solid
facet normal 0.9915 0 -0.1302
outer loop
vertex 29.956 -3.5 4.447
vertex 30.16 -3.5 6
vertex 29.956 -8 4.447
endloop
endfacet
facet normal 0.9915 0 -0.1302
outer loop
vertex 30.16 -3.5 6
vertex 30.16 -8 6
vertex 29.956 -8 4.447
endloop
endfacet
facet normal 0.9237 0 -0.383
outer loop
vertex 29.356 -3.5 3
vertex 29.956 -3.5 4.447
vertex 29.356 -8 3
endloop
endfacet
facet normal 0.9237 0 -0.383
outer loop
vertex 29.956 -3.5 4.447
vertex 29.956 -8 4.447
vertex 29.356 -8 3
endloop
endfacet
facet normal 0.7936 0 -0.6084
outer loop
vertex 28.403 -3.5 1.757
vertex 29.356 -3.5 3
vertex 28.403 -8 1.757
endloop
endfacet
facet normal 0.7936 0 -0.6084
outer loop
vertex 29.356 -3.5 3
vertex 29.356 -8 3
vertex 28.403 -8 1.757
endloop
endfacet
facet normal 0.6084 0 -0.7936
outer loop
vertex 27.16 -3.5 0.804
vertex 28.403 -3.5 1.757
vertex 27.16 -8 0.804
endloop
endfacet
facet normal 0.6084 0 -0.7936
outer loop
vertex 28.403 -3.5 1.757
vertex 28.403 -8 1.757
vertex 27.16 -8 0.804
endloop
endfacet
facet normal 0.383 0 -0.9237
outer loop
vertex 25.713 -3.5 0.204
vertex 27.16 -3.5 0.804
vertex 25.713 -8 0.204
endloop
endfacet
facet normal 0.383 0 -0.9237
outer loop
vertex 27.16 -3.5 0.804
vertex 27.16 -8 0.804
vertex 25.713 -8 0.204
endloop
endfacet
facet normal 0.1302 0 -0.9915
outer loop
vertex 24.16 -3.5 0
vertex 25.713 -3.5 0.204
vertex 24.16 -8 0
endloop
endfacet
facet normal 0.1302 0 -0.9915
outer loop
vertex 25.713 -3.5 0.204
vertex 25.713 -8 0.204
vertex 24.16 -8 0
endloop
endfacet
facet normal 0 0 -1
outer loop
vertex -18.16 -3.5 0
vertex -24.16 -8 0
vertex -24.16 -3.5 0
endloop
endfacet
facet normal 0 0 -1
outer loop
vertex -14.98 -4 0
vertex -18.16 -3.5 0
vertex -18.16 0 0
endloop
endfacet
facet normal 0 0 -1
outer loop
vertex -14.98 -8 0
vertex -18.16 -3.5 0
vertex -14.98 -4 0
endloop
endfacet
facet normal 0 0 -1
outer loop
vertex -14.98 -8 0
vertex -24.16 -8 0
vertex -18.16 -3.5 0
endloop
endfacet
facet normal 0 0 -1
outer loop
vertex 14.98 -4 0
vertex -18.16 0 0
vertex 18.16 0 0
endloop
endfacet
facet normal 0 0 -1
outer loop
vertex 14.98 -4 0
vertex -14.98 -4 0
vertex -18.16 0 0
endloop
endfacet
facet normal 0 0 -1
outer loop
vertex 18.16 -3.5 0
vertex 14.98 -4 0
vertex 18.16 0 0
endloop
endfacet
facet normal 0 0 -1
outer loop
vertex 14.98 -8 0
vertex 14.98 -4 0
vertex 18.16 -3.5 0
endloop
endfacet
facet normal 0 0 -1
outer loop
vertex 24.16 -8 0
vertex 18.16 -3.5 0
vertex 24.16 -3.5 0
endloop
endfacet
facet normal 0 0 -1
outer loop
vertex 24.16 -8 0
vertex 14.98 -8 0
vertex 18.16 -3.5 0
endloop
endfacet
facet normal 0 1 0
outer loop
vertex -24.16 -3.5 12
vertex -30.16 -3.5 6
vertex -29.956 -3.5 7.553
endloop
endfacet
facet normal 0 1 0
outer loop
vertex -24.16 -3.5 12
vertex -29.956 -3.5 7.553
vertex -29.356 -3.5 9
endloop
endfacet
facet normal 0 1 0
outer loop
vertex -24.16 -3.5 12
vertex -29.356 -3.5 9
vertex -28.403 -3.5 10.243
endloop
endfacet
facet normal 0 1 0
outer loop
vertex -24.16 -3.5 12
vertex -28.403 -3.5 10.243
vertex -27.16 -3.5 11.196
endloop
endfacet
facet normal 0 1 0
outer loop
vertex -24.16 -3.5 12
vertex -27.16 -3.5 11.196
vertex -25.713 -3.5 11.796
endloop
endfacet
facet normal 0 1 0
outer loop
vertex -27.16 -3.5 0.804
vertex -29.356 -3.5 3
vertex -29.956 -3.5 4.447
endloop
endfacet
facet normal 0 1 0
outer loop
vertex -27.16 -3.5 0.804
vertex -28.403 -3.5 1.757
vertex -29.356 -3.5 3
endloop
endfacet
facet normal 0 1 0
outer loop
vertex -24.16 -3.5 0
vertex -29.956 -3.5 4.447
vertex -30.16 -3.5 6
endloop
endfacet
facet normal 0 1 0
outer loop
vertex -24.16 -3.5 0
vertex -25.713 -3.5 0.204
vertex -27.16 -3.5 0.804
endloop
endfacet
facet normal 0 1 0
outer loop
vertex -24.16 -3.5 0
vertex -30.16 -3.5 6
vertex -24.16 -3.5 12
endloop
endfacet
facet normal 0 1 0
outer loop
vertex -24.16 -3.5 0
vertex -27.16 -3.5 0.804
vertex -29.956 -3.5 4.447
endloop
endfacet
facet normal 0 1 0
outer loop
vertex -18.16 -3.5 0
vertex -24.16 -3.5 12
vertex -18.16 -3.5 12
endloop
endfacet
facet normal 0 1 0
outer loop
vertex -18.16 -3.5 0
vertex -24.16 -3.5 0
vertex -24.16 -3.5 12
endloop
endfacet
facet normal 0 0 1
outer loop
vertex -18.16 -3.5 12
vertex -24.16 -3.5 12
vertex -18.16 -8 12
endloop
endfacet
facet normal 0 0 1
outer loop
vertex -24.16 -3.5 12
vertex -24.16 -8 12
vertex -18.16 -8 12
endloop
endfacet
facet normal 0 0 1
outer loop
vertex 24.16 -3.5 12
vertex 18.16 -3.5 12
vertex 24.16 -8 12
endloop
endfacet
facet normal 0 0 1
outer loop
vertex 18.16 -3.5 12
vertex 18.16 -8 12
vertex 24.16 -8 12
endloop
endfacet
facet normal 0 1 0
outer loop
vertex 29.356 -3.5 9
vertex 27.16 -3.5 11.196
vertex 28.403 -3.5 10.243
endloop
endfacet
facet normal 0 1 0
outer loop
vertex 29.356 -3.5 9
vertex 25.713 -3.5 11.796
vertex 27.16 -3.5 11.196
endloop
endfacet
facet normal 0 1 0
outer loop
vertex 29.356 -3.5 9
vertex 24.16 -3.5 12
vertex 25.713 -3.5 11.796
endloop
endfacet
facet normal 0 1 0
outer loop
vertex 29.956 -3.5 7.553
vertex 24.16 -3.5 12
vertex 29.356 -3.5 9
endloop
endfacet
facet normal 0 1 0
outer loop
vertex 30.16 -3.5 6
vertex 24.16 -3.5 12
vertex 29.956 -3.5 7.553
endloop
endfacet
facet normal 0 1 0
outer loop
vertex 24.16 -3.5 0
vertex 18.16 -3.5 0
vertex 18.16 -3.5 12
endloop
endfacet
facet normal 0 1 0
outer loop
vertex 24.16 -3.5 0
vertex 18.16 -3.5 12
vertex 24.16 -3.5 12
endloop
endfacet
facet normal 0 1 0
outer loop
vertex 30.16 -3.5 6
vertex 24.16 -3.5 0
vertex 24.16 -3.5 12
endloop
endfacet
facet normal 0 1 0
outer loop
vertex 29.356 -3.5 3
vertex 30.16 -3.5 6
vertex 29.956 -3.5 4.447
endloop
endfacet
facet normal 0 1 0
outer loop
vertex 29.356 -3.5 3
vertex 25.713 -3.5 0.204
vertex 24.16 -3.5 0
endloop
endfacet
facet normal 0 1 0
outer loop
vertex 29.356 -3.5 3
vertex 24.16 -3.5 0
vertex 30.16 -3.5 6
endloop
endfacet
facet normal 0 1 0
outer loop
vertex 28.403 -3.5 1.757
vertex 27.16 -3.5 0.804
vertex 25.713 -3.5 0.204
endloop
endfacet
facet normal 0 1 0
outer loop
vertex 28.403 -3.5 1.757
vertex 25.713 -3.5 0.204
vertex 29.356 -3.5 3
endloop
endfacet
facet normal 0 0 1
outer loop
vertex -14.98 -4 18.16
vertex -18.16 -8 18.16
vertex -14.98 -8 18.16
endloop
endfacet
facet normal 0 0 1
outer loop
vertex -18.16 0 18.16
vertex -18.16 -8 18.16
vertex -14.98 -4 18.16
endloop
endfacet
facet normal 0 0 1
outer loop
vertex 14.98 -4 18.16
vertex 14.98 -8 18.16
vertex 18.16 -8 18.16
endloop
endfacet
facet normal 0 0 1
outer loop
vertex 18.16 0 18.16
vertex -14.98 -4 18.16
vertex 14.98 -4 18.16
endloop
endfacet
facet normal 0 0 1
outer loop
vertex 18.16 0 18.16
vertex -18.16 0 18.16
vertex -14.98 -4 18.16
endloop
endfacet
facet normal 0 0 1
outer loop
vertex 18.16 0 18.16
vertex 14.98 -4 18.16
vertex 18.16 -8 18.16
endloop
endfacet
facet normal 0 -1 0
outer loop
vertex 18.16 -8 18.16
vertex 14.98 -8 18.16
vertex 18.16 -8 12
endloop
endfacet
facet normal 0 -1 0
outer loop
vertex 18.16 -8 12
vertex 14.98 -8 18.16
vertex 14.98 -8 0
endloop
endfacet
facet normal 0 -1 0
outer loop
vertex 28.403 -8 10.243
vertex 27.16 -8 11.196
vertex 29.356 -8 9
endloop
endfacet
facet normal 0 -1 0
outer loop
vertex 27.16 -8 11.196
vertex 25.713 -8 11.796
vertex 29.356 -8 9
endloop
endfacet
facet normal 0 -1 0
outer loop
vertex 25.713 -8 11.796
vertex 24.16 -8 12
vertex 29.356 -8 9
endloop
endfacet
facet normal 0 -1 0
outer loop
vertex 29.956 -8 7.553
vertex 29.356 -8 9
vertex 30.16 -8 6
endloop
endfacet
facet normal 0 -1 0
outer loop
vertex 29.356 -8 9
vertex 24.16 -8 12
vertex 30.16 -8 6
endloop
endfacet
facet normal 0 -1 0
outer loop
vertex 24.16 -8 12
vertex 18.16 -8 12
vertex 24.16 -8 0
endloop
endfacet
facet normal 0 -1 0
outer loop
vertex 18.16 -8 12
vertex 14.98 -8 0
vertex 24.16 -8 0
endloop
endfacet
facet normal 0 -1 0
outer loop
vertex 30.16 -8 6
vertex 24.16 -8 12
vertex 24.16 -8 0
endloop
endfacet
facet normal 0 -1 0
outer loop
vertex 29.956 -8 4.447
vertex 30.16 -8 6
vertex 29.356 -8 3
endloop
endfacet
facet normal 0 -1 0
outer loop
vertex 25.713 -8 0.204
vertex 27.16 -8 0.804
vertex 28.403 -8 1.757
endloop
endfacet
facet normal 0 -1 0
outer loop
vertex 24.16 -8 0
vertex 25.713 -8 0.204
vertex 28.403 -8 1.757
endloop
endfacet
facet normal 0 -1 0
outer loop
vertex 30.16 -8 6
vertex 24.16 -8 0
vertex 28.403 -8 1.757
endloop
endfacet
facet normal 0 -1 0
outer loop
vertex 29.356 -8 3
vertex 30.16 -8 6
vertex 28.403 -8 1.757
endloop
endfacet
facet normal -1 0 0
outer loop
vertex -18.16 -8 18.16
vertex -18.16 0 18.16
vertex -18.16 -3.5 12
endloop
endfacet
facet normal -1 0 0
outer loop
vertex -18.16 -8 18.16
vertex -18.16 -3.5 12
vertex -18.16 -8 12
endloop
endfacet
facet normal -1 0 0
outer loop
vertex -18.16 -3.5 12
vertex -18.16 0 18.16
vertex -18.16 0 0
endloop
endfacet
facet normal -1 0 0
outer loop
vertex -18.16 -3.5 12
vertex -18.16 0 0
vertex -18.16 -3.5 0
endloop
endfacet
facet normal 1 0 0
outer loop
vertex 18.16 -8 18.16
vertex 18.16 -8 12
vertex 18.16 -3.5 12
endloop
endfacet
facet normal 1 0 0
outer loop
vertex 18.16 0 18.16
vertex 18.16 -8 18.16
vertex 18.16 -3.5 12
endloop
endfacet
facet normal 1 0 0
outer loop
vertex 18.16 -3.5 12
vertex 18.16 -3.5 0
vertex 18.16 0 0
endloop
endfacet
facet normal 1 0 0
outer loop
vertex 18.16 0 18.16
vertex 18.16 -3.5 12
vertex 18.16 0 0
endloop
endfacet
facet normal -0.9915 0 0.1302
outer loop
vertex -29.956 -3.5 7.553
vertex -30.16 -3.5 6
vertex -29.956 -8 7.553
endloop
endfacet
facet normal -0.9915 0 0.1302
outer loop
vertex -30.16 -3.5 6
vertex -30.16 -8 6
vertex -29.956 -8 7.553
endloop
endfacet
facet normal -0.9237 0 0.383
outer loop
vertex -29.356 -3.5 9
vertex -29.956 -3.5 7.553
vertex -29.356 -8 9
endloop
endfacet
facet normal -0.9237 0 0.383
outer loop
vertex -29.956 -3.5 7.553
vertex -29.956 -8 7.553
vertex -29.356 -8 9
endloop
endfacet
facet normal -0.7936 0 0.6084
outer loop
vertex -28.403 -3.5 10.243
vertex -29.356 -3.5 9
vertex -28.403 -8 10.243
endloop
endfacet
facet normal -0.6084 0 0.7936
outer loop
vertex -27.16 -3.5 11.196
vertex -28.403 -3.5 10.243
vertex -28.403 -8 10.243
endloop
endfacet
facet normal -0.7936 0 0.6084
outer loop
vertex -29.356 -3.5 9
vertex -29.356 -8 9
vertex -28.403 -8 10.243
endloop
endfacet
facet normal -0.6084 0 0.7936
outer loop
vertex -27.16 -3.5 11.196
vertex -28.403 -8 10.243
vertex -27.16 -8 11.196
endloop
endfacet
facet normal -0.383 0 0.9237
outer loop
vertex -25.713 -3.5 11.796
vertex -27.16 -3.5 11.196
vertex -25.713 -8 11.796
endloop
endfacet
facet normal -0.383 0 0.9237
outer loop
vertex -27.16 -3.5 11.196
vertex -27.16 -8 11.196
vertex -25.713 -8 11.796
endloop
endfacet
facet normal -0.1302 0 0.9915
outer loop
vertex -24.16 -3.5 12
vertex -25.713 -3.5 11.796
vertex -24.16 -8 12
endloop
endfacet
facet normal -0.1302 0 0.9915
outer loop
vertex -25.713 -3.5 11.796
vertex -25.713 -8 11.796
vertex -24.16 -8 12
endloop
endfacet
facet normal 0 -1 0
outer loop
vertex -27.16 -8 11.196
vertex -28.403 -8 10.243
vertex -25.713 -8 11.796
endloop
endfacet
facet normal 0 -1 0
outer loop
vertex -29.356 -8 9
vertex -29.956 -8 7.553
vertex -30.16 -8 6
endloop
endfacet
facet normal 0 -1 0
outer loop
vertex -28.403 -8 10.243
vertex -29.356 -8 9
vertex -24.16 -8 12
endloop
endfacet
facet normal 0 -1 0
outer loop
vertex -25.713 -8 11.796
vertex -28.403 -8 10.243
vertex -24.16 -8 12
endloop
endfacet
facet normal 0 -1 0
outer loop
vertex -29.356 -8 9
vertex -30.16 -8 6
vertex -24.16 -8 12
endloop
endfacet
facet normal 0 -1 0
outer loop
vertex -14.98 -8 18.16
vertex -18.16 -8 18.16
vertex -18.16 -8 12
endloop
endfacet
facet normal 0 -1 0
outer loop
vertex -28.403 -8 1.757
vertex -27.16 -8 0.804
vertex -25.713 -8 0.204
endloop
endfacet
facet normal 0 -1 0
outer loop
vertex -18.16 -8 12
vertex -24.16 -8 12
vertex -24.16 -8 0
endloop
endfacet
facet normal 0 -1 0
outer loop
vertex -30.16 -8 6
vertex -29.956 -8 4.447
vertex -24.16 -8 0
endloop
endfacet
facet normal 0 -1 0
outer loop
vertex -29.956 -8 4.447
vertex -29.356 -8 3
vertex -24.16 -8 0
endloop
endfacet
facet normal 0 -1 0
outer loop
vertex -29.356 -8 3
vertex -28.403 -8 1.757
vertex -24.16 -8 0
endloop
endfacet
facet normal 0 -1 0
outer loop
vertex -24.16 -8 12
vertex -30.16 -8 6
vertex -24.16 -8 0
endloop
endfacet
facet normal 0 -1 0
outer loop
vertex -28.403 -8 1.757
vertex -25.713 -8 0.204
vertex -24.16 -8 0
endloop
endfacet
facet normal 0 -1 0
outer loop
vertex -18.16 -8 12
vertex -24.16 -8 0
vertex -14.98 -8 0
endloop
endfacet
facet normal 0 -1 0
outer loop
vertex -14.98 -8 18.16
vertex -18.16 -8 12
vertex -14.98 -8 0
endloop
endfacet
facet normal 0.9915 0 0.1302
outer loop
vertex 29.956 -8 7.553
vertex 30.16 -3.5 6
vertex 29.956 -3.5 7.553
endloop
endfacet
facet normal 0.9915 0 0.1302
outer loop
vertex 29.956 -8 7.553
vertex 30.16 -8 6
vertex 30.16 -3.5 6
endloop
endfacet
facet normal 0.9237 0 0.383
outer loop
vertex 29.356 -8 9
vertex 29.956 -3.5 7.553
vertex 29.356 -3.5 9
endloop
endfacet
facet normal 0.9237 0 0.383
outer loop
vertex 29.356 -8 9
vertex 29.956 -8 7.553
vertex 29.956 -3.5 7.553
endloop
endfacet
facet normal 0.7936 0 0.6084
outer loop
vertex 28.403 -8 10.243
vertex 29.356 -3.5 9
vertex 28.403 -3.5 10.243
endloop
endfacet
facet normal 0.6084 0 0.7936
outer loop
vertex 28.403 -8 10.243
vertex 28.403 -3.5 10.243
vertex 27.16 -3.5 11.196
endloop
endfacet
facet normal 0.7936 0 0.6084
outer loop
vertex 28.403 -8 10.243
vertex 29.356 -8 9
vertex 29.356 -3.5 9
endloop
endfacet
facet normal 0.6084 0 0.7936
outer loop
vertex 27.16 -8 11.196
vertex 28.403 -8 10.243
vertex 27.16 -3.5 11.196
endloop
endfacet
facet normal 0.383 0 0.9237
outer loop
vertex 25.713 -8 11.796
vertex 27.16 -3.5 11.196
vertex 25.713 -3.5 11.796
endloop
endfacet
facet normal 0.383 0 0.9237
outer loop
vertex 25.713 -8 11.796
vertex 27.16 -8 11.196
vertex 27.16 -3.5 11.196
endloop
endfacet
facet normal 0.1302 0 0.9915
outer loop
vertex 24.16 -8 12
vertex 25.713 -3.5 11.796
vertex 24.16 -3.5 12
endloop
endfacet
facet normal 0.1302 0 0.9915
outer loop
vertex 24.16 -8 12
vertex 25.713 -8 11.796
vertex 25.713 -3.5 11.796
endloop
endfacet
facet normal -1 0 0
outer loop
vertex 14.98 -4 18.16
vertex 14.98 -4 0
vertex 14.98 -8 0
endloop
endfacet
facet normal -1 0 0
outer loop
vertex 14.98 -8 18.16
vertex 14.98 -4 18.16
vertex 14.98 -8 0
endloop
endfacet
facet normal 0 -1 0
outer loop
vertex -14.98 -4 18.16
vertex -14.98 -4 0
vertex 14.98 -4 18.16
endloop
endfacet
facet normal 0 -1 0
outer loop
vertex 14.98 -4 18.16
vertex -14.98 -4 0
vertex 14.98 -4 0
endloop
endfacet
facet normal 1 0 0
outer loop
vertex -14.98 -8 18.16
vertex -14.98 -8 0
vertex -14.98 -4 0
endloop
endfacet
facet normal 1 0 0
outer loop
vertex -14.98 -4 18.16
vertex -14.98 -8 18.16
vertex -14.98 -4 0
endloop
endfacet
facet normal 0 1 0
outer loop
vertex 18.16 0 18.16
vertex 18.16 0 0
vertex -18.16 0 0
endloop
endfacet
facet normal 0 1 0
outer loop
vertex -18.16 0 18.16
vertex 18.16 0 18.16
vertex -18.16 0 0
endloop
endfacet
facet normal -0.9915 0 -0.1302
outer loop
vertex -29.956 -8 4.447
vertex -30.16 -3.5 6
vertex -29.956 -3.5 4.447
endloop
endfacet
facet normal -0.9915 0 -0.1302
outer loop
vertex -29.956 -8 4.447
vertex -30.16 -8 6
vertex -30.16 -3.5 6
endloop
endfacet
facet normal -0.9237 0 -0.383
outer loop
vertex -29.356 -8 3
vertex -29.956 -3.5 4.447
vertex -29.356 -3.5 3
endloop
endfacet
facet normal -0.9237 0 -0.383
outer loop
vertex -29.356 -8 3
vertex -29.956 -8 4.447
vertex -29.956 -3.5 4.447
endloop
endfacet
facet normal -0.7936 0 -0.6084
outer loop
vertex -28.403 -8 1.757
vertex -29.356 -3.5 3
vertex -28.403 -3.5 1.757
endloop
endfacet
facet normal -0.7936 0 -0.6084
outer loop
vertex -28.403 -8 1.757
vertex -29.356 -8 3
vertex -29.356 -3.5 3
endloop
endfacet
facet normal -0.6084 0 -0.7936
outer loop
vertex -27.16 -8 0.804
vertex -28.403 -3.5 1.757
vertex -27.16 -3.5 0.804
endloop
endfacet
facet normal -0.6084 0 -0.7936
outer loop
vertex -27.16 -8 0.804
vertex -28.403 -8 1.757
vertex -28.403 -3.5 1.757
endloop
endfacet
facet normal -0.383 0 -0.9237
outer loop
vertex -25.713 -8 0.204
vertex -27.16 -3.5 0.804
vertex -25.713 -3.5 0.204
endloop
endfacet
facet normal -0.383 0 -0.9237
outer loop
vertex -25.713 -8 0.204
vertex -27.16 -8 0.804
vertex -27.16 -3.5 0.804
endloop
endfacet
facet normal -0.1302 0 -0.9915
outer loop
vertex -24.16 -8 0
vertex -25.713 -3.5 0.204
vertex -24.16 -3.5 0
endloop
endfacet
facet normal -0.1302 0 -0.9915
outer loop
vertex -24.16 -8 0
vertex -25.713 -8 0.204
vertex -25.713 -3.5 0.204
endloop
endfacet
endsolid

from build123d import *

# Parameters (mm, degrees)
F1_DEPTH = 18.16
F2_W     = 12
F2_H     = 4.5
F3_DEPTH = 12
F4_R     = 5.99999


# Not quite as in the source:
# - a fillet or chamfer is up to 0.001 mm smaller than in the source, because OpenCascade refuses the exact size


with BuildPart() as f1:
    # F0 (on Top) → F1 (new body)
    with BuildSketch(Plane.XY):
        Polygon((18.16, 0), (-18.16, 0), (-18.16, -8), (-14.98, -8), (-14.98, -4), (14.98, -4), (14.98, -8), (18.16, -8), align=None)
    extrude(amount=F1_DEPTH)

    # F2 (on face) → F3 (join)
    with BuildSketch(Plane(origin=(0, 0, 0), x_dir=(1, 0, 0), z_dir=(0, 0, -1))):
        with Locations((-24.16, 5.75)):
            Rectangle(F2_W, F2_H)
        with Locations((24.16, 5.75)):
            Rectangle(F2_W, F2_H)
    extrude(amount=-F3_DEPTH)

    # F4 (radius 6 in the source; OpenCascade refuses exactly that, so slightly less here)
    f4_edges = [f1.edges().sort_by_distance(p)[0] for p in [
        (-30.16, -5.75, 12),
        (-30.16, -5.75, 0),
        (30.16, -5.75, 0),
        (30.16, -5.75, 12),
    ]]
    fillet(f4_edges, radius=F4_R)


solid = f1.part
